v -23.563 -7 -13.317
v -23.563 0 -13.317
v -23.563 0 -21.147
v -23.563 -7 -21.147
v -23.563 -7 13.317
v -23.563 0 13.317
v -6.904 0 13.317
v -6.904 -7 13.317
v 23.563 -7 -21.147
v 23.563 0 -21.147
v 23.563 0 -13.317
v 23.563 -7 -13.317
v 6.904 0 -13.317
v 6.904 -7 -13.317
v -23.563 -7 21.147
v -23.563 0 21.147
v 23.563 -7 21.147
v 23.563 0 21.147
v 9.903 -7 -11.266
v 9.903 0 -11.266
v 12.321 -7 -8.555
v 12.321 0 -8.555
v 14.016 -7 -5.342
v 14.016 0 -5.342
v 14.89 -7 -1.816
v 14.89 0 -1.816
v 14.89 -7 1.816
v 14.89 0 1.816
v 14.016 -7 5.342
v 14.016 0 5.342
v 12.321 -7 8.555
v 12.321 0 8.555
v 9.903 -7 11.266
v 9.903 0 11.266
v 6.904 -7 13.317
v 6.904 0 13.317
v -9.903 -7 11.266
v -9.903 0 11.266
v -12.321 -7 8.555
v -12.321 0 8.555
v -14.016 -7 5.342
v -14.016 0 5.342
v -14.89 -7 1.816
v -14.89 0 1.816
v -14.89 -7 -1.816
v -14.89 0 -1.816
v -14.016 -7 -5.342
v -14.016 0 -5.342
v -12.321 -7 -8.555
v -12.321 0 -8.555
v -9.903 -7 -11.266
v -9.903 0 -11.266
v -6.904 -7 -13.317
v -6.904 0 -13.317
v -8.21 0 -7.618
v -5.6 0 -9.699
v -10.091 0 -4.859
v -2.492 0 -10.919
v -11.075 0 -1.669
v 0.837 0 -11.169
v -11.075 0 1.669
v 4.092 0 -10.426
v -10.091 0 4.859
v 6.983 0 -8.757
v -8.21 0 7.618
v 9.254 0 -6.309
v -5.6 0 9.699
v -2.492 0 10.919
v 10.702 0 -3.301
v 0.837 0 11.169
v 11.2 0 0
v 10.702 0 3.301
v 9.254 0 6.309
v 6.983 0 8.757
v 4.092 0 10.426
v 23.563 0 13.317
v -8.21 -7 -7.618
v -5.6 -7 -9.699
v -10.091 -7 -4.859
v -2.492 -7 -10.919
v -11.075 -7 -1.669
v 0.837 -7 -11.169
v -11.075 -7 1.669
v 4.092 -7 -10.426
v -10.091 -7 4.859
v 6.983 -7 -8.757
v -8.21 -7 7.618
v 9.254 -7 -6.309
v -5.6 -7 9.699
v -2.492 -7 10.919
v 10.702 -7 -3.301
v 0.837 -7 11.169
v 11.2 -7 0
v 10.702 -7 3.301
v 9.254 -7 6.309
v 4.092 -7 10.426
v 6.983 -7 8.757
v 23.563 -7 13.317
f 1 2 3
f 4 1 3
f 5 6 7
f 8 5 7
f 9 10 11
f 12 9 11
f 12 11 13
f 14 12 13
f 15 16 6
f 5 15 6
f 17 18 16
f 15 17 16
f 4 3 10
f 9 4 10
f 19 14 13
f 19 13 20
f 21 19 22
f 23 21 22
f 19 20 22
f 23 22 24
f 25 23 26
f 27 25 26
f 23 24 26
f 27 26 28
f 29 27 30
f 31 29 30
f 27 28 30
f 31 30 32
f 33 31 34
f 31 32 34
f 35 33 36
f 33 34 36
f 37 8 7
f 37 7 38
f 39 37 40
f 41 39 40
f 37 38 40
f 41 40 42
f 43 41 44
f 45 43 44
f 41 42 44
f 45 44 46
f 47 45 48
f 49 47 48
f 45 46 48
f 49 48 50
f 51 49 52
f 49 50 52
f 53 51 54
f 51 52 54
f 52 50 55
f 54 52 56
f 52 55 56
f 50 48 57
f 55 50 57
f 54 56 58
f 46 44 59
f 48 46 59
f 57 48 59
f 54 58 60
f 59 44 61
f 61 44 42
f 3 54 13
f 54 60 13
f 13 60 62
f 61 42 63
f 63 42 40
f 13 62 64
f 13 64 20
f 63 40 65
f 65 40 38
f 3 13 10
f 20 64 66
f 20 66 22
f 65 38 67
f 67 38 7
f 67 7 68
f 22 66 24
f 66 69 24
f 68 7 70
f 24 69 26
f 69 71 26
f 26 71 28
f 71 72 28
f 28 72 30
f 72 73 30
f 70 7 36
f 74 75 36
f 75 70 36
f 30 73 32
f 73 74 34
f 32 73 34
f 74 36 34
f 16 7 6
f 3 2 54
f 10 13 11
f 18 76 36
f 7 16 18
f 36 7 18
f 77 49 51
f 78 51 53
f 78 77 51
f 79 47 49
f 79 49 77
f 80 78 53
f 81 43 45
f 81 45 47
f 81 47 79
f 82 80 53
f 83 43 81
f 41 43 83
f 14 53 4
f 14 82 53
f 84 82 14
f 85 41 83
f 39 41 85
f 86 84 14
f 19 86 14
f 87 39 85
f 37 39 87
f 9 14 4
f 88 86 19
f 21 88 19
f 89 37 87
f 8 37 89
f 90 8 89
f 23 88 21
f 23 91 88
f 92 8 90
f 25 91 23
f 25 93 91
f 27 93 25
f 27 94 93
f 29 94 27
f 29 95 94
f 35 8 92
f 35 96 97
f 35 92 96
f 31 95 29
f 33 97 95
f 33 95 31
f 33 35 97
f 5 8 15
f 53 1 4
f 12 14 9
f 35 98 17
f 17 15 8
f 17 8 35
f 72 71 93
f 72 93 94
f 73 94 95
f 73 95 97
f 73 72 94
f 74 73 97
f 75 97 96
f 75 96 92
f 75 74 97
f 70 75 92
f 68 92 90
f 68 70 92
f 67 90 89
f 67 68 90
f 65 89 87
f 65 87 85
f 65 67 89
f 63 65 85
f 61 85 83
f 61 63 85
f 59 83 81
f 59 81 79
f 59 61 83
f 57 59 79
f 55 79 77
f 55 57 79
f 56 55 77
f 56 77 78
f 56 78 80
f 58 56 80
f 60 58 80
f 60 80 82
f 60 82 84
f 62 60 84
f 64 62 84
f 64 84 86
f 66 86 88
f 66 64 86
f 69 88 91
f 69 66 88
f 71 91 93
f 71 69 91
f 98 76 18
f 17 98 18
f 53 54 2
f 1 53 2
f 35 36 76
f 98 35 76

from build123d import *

# Parameters (mm, degrees)
F0_R     = 11.2
F1_DEPTH = 7


# Not quite as in the source:
# - a feature names something its author has since deleted; it is built from what else it names


with BuildPart() as f1:
    # F0 (on Front) → F1 (new body)
    with BuildSketch(Plane.XZ):
        with BuildLine():
            Line((-23.5628467053, 13.316613622), (-6.9041872543, 13.316613622))
            ThreePointArc((-6.9041872543, 13.316613622), (-15, 0), (-6.9041872543, -13.316613622))
            Line((-6.9041872543, -13.316613622), (-23.5628467053, -13.316613622))
            Line((-23.5628467053, -13.316613622), (-23.5628467053, -21.1474765092))
            Line((-23.5628467053, -21.1474765092), (0, -21.1474765092))
            Line((0, -21.1474765092), (23.5628467053, -21.1474765092))
            Line((23.5628467053, -21.1474765092), (23.5628467053, -13.316613622))
            Line((23.5628467053, -13.316613622), (6.9041872543, -13.316613622))
            ThreePointArc((6.9041872543, -13.316613622), (15, 0), (6.9041872543, 13.316613622))
            Line((6.9041872543, 13.316613622), (23.5628467053, 13.316613622))
            Line((23.5628467053, 13.316613622), (23.5628467053, 21.1474765092))
            Line((23.5628467053, 21.1474765092), (0, 21.1474765092))
            Line((0, 21.1474765092), (-23.5628467053, 21.1474765092))
            Line((-23.5628467053, 21.1474765092), (-23.5628467053, 13.316613622))
        make_face()
        Circle(F0_R, mode=Mode.SUBTRACT)
    extrude(amount=F1_DEPTH)


solid = f1.part
